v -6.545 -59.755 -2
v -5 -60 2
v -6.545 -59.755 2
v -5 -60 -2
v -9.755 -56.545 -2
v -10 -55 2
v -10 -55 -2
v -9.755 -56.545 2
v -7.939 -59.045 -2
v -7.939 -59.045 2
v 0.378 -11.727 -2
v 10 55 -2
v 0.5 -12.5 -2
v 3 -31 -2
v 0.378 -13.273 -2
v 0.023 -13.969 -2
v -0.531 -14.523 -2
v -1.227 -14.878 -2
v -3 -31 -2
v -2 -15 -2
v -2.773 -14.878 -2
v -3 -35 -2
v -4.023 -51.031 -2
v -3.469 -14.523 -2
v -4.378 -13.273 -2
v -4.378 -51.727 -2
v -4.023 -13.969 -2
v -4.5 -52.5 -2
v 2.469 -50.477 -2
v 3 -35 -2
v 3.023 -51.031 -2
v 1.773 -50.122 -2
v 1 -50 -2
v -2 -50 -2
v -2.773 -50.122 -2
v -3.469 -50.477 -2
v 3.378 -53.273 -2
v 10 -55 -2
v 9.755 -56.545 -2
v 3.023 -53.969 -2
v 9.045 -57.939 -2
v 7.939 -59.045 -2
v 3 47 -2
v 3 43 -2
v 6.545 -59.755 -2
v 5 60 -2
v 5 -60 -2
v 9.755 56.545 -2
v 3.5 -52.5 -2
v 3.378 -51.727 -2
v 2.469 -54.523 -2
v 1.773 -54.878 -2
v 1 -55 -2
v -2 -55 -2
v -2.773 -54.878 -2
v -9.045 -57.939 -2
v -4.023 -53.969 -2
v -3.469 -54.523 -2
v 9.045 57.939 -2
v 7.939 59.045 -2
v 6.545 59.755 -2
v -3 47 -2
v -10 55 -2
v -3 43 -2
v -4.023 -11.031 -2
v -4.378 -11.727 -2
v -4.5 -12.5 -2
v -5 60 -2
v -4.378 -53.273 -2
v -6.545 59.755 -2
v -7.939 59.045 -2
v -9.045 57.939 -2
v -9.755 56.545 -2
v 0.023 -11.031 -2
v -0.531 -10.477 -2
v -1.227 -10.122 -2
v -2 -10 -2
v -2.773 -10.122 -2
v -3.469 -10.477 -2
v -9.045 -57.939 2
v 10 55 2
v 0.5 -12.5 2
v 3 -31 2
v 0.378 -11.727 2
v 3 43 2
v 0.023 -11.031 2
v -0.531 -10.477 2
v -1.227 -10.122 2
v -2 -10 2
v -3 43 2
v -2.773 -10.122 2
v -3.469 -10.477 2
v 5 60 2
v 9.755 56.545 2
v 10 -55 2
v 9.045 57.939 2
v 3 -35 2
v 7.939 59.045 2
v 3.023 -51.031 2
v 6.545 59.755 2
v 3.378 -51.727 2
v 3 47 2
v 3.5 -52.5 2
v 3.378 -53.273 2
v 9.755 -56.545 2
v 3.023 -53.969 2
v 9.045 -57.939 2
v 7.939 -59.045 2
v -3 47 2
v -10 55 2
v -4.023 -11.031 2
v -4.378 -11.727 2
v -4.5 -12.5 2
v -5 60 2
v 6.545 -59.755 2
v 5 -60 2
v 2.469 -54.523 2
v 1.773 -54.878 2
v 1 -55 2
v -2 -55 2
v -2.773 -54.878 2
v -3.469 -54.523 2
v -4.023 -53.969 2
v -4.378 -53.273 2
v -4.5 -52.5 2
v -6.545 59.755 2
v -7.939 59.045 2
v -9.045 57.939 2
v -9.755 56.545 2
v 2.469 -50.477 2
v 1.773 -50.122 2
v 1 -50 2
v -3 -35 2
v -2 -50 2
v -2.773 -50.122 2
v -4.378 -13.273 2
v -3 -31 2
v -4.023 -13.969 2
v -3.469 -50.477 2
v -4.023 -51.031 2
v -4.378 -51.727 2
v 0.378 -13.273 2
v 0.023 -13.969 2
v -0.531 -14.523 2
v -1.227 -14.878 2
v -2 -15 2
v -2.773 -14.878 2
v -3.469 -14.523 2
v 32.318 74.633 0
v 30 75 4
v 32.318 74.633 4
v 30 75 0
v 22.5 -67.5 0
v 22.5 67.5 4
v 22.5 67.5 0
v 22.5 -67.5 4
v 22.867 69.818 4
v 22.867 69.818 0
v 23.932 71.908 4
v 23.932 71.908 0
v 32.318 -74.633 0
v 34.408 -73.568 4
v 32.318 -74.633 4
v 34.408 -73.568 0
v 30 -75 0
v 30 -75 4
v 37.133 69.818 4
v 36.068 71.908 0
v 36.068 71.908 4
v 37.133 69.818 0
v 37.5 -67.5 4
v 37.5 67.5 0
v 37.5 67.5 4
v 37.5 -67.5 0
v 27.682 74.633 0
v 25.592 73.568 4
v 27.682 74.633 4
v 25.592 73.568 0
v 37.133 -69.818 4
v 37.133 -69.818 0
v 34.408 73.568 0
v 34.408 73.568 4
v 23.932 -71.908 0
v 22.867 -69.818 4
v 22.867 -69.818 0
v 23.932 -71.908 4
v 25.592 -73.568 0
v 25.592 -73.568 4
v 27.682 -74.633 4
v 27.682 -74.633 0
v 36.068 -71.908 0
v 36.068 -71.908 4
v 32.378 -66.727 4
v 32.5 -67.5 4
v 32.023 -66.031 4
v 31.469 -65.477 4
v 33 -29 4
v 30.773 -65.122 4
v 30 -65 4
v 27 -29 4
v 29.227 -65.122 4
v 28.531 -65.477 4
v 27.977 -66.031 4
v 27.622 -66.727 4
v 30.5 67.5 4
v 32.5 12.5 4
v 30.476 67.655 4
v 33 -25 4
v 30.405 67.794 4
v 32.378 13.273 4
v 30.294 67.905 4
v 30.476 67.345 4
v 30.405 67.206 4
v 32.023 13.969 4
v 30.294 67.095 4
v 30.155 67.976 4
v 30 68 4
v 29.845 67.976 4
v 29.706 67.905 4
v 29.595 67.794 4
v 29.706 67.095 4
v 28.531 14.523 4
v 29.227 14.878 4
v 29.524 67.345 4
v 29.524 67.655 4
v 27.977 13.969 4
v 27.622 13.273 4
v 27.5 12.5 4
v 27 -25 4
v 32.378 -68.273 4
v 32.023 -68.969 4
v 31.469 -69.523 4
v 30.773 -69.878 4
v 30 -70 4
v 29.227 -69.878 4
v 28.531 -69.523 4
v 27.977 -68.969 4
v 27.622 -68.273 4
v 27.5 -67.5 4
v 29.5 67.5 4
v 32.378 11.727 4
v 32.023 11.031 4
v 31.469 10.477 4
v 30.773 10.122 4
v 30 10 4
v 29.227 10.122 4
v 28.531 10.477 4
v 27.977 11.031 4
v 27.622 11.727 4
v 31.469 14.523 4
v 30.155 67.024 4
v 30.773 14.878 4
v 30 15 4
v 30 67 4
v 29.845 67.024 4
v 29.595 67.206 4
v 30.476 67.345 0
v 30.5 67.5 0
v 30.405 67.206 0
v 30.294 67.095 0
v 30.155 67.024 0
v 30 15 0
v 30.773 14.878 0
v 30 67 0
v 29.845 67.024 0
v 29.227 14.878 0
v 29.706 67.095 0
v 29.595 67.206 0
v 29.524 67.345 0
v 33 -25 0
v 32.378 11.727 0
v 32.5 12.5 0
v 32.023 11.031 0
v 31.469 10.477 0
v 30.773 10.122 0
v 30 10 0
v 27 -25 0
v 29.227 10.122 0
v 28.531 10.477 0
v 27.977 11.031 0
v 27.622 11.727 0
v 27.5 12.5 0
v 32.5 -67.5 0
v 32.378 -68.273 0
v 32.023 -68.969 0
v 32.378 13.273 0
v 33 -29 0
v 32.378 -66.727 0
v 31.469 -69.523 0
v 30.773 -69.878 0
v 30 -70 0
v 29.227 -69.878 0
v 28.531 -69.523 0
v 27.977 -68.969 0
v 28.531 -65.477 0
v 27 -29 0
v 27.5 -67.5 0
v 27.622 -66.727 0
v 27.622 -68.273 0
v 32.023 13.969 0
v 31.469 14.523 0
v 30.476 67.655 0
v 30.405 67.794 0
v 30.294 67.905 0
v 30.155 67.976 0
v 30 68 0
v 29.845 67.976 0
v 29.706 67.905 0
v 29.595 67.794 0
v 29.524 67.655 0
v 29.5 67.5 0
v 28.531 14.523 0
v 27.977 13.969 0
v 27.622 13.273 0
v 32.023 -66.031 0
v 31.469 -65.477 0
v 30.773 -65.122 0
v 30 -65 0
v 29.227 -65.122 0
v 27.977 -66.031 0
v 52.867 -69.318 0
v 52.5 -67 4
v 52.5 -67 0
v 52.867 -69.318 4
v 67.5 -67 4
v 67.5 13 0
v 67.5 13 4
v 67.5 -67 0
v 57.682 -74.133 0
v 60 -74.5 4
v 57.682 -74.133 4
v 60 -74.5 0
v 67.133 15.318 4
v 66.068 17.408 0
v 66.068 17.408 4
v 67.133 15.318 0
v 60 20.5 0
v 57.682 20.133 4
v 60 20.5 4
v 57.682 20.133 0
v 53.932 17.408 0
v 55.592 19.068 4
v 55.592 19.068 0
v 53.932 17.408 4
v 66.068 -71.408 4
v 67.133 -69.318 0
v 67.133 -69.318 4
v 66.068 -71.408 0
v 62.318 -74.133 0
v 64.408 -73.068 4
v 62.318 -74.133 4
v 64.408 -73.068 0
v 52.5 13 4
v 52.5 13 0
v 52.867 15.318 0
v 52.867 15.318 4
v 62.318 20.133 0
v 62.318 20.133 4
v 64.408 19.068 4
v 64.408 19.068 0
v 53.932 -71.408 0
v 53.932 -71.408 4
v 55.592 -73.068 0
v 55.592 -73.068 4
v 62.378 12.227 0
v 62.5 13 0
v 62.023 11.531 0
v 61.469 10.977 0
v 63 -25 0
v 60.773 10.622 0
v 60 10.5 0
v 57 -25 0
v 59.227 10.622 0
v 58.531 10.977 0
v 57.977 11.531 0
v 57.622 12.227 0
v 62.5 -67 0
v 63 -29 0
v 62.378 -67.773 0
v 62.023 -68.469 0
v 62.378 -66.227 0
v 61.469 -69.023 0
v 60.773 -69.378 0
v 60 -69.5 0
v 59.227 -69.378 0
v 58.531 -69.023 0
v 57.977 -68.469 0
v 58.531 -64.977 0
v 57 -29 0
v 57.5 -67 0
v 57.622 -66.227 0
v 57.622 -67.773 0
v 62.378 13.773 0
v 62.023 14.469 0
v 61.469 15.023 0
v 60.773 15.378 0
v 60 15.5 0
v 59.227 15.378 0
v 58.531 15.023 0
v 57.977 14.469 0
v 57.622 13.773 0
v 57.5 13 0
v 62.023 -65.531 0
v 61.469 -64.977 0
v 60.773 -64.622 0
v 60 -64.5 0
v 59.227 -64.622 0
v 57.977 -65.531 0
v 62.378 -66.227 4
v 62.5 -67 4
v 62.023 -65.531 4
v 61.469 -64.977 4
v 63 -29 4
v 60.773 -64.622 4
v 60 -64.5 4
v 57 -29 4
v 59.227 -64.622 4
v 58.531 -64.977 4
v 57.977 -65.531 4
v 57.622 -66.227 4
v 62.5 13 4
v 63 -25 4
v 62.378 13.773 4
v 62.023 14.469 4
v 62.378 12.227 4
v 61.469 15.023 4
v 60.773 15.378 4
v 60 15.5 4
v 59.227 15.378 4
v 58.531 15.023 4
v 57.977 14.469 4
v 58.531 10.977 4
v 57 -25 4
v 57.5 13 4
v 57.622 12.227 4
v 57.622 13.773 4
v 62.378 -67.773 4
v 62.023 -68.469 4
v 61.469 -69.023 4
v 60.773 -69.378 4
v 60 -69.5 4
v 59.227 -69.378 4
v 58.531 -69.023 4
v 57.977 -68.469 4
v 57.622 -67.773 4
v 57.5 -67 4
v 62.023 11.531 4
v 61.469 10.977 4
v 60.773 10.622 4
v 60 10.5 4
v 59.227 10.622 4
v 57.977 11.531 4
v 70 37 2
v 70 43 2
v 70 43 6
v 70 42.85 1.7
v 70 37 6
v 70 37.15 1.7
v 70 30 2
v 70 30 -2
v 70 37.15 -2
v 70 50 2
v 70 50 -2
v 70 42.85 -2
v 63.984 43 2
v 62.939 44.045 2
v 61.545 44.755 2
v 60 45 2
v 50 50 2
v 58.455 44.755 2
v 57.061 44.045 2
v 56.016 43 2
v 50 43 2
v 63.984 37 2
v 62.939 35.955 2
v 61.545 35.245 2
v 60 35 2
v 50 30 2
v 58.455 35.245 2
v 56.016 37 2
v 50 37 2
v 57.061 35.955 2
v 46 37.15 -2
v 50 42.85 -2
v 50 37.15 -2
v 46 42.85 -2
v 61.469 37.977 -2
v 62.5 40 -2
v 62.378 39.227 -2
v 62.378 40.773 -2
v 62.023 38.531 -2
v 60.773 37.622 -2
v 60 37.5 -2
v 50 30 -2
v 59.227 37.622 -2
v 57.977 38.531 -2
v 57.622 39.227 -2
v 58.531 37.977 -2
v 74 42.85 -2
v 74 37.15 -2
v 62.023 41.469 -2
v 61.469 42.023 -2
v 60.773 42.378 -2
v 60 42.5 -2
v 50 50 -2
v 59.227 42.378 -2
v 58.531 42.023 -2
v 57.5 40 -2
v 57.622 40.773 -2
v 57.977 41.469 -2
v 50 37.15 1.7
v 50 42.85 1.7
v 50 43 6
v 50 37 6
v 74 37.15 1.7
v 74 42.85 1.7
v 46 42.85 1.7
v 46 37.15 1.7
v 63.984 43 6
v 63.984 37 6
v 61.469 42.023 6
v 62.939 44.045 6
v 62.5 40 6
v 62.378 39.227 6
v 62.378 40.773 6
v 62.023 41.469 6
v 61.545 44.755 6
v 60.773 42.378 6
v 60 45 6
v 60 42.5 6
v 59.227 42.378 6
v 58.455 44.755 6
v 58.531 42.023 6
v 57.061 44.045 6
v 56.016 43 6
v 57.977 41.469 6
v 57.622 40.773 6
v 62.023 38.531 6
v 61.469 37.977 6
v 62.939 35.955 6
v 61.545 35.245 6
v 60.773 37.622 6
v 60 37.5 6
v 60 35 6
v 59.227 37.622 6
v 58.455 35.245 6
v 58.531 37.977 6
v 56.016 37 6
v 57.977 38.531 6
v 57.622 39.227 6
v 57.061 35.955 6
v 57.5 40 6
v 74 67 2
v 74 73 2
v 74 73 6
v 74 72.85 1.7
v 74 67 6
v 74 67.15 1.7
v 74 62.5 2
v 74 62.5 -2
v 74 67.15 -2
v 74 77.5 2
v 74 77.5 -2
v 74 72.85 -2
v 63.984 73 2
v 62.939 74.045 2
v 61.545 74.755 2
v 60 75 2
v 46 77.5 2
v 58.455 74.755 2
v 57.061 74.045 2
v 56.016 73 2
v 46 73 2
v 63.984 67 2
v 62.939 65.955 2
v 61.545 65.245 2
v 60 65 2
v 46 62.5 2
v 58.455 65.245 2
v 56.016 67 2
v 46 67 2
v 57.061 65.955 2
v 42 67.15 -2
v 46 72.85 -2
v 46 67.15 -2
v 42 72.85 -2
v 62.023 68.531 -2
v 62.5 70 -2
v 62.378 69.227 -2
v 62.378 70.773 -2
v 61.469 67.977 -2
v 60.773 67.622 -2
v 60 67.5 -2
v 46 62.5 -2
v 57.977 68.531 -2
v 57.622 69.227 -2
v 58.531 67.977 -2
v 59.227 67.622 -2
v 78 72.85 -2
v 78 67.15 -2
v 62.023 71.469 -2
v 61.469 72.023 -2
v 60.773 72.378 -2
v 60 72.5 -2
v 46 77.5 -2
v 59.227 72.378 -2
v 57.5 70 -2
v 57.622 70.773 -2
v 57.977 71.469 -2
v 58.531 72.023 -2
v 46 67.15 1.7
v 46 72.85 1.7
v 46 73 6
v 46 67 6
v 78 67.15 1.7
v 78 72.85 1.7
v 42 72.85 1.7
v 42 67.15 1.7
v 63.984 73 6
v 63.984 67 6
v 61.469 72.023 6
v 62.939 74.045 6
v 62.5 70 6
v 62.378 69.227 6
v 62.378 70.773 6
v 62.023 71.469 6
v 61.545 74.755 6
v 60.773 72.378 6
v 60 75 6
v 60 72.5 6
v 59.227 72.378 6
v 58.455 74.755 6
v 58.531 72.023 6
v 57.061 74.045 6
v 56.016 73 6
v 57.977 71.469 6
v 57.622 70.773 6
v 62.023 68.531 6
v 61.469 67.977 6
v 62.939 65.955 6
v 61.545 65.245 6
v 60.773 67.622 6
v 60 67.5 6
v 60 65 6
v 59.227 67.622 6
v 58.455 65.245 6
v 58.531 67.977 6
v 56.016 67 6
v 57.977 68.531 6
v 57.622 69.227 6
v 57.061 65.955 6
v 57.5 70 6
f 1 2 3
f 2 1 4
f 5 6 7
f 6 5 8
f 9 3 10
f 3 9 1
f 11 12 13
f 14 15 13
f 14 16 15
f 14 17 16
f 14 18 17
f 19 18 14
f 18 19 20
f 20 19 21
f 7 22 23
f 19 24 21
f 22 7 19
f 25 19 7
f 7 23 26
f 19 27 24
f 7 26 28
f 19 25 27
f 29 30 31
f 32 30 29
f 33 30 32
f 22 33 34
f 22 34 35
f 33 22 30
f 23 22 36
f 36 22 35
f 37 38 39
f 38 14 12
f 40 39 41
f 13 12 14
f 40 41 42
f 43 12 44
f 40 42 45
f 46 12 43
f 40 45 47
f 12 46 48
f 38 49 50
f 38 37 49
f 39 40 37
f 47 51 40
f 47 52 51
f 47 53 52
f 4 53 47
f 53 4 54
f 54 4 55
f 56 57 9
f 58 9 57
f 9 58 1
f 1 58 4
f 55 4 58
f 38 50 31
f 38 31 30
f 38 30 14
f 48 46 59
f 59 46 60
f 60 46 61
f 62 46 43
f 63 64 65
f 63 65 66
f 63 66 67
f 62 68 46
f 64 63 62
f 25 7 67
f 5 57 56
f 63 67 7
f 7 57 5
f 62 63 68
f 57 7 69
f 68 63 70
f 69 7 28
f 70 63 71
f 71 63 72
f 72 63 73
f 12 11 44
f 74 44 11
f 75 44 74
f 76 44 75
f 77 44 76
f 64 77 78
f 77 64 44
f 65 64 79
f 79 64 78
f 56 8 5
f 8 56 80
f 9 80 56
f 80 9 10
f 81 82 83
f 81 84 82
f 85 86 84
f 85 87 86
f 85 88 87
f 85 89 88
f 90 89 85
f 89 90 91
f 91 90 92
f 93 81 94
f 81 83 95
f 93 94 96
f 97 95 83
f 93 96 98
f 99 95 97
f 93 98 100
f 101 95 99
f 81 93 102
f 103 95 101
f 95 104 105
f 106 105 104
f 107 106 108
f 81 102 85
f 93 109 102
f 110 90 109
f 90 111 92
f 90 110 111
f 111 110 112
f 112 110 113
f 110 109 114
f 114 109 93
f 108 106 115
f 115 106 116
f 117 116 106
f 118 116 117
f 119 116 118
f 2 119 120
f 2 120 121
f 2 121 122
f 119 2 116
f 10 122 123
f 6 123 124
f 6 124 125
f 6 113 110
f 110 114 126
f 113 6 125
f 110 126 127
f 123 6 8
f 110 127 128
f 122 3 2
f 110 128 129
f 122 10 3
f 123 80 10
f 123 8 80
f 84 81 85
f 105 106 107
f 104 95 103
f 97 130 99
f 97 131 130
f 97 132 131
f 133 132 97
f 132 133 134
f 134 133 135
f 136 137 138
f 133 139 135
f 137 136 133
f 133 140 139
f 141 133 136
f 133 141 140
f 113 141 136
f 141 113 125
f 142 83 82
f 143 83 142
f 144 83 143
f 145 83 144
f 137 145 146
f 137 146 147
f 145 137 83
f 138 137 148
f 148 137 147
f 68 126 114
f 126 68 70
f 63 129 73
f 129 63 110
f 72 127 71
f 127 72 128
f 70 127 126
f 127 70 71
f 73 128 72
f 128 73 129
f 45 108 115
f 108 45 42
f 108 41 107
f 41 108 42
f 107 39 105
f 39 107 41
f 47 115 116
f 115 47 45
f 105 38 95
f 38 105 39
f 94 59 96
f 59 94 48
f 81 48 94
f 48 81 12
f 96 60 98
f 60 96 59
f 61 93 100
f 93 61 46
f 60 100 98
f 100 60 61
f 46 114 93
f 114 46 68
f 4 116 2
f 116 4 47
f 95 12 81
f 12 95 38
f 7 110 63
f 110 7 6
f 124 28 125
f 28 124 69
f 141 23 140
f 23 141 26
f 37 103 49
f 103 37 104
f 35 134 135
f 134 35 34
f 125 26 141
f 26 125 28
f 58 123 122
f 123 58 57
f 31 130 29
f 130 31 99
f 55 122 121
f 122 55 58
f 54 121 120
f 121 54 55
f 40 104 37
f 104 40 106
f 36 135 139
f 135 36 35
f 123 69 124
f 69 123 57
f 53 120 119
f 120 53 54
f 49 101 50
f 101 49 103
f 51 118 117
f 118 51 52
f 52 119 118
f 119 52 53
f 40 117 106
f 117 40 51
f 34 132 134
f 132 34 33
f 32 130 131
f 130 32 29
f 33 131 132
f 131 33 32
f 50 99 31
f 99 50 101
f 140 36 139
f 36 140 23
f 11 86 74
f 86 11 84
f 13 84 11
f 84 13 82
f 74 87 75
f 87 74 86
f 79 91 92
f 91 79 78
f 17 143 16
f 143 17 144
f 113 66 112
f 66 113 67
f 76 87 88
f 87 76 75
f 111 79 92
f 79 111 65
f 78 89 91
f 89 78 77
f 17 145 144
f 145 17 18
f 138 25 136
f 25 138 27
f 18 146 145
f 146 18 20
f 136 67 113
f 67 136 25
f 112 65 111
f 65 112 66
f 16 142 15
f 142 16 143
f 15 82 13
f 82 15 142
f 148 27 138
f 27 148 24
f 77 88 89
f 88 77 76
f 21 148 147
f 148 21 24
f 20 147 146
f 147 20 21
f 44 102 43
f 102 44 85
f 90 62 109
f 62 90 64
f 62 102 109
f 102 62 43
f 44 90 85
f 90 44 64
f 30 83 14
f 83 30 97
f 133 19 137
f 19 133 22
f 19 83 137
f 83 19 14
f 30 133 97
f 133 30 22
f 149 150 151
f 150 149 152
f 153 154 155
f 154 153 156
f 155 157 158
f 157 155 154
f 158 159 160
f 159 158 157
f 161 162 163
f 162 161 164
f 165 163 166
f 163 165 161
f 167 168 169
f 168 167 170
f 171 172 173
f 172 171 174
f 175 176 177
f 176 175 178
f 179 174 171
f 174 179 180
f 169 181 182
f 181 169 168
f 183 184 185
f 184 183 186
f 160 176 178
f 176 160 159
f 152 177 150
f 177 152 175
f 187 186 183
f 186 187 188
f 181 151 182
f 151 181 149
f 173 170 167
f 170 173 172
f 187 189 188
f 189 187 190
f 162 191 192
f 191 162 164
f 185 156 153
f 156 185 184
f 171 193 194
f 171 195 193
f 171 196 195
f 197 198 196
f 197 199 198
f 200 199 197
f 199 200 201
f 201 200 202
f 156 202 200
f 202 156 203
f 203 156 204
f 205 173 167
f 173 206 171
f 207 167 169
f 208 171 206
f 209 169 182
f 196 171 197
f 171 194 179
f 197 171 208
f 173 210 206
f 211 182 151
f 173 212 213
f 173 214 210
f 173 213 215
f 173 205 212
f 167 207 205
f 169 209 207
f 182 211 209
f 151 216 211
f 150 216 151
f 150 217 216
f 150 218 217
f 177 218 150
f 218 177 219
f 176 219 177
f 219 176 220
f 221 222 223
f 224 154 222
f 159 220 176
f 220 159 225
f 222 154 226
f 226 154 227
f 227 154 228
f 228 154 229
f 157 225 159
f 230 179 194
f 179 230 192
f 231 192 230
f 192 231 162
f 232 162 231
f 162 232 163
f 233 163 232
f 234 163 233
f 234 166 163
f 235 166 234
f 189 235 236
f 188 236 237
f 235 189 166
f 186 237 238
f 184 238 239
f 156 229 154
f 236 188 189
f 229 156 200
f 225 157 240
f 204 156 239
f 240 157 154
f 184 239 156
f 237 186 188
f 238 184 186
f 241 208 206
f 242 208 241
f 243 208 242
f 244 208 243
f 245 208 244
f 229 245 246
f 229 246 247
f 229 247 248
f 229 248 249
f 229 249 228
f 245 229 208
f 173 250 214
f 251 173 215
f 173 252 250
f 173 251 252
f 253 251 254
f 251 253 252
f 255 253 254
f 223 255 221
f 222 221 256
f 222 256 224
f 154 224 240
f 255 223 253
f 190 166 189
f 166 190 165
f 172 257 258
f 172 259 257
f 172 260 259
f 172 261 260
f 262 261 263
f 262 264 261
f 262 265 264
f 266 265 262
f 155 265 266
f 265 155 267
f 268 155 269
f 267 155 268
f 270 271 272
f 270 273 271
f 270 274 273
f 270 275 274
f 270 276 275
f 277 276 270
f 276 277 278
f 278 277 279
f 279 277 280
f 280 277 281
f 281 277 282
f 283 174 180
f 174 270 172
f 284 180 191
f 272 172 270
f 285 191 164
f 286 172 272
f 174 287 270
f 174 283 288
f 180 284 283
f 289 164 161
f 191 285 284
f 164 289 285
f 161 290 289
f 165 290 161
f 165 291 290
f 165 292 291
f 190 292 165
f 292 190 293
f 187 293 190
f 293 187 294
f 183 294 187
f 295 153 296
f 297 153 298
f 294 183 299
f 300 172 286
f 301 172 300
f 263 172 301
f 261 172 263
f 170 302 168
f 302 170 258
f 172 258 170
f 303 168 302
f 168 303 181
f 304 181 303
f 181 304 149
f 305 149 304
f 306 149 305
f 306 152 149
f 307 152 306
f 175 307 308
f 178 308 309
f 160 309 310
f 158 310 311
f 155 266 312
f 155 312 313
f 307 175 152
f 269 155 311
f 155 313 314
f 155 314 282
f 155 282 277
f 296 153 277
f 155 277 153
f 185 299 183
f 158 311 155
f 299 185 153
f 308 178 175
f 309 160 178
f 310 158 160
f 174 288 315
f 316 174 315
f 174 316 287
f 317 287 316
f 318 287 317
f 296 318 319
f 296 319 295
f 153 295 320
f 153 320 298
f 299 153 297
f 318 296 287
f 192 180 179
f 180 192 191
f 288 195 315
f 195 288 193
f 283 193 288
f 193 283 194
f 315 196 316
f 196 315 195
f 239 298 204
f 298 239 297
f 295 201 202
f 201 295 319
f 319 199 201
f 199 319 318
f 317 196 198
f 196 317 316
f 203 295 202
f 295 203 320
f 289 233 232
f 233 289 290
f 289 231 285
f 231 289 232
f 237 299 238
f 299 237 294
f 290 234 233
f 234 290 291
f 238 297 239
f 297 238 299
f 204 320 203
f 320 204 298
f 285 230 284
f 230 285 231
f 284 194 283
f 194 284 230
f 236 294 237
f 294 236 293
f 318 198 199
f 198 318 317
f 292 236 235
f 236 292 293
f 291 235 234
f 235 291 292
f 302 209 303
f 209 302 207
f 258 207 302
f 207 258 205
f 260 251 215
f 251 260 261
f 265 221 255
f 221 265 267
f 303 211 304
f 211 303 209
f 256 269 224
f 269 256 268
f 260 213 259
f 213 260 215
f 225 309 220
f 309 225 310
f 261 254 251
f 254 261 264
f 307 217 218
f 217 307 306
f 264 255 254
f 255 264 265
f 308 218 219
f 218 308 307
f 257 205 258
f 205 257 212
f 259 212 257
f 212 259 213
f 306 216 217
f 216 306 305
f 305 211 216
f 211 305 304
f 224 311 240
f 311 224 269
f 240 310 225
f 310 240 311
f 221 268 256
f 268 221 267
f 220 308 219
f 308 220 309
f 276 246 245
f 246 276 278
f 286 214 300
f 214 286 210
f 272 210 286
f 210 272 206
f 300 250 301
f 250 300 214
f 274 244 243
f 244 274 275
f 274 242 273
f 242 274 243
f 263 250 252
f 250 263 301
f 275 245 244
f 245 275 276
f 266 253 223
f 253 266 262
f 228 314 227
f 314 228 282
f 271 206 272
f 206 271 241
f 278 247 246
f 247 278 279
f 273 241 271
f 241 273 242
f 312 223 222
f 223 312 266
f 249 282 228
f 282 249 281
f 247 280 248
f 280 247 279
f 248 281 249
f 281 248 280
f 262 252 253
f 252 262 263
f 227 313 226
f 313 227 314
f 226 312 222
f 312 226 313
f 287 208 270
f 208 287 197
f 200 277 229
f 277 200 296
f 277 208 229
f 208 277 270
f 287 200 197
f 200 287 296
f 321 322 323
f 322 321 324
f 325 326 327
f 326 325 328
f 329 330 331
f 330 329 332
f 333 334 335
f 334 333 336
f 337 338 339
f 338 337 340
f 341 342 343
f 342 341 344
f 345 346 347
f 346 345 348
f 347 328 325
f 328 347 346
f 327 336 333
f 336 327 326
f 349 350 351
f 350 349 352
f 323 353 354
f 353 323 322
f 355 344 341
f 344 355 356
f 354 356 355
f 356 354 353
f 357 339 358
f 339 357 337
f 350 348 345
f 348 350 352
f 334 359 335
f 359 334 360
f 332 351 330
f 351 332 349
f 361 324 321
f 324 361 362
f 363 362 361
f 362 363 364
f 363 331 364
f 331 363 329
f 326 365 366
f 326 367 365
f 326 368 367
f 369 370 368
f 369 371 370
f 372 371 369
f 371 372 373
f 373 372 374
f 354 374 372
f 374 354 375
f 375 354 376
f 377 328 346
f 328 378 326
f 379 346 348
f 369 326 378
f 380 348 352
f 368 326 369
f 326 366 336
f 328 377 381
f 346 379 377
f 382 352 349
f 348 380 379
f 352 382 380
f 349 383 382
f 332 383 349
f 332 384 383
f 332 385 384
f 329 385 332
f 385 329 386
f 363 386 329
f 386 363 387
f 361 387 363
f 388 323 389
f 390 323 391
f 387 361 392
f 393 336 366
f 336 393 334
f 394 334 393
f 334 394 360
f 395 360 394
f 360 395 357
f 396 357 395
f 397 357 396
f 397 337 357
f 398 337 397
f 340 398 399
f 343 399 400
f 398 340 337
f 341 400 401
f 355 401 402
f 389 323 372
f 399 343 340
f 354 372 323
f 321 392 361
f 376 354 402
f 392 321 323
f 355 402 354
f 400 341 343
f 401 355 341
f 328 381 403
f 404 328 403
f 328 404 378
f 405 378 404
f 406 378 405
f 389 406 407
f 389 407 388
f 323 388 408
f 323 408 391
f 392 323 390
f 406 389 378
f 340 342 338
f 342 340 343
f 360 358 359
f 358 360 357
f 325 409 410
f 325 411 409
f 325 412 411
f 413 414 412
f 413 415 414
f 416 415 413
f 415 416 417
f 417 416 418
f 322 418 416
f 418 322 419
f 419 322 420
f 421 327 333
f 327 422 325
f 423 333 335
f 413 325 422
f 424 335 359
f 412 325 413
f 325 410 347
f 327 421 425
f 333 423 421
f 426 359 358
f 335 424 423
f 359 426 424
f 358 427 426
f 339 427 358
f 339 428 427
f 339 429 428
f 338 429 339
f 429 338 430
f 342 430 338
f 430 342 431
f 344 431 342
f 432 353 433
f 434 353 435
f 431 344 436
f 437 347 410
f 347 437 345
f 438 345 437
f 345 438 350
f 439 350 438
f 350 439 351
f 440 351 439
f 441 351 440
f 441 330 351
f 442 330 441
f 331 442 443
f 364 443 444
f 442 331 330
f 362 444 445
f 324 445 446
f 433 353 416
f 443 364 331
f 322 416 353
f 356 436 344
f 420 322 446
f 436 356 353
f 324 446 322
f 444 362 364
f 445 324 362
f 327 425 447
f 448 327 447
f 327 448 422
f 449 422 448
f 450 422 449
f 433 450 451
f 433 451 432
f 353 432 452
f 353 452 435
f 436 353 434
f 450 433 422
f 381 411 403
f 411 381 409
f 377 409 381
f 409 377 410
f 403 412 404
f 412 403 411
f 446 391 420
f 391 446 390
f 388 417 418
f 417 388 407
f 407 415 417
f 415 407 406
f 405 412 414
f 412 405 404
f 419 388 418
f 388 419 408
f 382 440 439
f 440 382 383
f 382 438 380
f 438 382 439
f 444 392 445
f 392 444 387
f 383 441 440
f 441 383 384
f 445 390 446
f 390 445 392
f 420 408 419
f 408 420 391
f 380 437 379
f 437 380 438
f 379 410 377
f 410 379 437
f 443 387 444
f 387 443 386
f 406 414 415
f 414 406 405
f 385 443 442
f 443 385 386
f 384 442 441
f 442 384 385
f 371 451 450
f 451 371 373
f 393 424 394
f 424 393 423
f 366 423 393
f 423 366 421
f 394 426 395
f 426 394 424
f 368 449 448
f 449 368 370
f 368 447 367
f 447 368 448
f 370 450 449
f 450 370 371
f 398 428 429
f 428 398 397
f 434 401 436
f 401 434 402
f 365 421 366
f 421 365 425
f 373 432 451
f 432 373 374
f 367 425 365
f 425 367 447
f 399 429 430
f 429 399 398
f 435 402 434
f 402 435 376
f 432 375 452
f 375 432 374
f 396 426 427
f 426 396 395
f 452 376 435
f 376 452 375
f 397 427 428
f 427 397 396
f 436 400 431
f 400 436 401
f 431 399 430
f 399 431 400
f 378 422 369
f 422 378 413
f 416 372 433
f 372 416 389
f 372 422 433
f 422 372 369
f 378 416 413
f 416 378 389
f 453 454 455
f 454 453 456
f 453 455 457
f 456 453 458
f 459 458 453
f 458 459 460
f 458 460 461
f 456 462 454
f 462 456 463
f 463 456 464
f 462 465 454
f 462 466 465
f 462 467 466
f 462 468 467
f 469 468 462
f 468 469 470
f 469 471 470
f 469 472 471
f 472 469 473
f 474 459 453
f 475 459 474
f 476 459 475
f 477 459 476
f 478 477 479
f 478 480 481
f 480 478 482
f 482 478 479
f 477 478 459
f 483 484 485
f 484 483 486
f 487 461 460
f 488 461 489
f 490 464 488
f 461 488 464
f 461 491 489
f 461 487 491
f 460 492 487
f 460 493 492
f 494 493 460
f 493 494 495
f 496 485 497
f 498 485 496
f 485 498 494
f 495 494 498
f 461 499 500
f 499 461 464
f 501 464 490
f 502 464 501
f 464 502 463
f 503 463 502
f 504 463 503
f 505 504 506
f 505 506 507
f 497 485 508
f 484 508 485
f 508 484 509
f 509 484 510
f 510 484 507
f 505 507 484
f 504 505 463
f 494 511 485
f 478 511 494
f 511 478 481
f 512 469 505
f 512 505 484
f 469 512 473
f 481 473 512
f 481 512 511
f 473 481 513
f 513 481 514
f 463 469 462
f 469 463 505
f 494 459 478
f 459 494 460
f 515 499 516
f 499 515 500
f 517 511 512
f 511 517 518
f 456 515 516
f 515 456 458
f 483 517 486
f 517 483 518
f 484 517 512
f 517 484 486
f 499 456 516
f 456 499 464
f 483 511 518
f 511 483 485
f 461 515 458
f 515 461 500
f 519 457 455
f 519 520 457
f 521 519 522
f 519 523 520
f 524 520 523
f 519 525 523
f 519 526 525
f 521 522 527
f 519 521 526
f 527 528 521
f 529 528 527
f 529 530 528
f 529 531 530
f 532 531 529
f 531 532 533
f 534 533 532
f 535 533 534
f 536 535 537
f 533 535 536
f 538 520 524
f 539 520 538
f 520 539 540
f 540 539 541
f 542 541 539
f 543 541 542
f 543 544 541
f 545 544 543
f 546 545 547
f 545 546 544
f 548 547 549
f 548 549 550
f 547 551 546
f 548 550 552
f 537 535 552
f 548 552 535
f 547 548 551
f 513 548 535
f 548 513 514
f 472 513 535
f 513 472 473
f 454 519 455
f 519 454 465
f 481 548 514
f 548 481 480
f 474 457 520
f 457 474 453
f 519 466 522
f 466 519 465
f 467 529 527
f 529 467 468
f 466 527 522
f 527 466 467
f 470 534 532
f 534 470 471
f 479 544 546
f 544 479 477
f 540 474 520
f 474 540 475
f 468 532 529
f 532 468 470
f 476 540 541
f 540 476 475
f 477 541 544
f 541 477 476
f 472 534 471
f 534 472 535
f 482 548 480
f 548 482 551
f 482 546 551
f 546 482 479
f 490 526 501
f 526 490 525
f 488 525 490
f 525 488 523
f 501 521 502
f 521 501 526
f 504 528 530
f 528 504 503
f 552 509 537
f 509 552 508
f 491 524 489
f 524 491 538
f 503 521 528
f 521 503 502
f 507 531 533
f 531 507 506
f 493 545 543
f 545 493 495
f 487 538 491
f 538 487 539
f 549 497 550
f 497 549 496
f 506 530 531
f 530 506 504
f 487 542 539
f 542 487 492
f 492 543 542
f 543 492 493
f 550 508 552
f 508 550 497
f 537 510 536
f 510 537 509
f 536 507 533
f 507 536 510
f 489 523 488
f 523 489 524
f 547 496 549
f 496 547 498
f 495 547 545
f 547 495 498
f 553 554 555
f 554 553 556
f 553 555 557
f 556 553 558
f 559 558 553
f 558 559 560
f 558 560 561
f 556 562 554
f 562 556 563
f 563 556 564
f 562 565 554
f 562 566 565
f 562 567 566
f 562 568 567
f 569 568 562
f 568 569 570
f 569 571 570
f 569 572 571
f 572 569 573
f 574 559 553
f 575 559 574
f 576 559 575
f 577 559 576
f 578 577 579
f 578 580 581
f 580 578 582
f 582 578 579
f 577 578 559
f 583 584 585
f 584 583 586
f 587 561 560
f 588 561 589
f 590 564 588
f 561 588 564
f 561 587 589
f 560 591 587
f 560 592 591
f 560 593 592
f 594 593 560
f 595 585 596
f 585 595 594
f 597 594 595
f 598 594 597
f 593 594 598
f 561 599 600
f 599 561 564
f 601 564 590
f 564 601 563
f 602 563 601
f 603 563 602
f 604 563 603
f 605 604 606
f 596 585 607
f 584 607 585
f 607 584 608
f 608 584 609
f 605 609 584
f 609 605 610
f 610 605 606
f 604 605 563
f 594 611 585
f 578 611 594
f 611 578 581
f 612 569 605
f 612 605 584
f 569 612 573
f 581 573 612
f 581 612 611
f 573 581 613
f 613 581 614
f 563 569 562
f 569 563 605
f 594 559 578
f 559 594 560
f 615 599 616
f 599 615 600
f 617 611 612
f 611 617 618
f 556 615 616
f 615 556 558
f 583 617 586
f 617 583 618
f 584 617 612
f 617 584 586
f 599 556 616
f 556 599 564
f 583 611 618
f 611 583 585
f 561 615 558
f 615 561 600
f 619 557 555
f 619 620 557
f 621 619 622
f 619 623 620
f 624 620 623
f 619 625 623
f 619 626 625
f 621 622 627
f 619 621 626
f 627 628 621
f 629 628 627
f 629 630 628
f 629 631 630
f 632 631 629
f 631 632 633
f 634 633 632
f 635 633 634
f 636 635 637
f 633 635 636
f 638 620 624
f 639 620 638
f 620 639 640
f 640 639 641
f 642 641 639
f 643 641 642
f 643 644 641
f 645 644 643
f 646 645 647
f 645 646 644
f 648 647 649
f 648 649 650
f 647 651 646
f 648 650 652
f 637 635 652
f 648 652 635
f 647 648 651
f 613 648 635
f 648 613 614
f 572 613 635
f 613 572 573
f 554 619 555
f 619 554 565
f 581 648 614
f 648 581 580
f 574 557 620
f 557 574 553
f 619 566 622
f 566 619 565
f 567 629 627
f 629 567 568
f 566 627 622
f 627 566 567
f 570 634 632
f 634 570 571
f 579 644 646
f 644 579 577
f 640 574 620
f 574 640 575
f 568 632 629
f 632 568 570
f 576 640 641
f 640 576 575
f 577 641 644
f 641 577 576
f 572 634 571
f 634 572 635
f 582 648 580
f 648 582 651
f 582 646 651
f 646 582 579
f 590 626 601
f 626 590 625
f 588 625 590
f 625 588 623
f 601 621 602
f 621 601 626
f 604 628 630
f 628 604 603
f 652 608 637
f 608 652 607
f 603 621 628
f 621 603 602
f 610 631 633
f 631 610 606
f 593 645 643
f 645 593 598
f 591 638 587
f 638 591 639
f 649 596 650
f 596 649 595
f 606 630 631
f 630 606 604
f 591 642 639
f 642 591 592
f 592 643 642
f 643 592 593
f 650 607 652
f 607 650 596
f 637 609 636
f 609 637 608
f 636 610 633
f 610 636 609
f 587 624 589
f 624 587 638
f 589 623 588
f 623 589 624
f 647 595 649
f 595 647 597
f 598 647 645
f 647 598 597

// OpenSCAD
$fn = 20;

DEMO = true;

SPACER_LENGTH = 6;

ARMS_SPACING = 20;

ARM_THICKNESS = 4;
ARM_WIDTH = 20;

module arm(width, length, height, hole = [5, 5], gap_width = 0, gap_length = 0) {

    difference() {
        hull() {
            translate([0, - length / 2, 0])
                cylinder(h = height, r1 = width / 2, r2 = width / 2);

            translate([0, length / 2, 0])
                cylinder(h = height, r1 = width / 2, r2 = width / 2);
        }

        // Hole
        translate([0, - length / 2, -1])
            cylinder(h = height + 1, r1 = hole[0] / 2, r2 = hole[0] / 2);
        translate([0, length / 2, -1])
            cylinder(h = height + 1, r1 = hole[1] / 2, r2 = hole[1] / 2);

        if (gap_width) {
            difference() {
                translate([0, 0,  height / 2])
                    cube(size = [gap_width, length - width, height * 2], center = true);
                translate([0, - length / 2, 0])
                    cylinder(h = height * 2, r1 = width / 2 + gap_length, r2 = width / 2 + gap_length);
                translate([0, length / 2, 0])
                    cylinder(h = height * 2, r1 = width / 2 + gap_length, r2 = width / 2 + gap_length);
            }
        }
    }
}

// Long arm
module long_arm() {
    difference() {
        arm(15, 135, 4, [5, 1], 0, 0);

        translate([0, 12.5, -1]) {
            cylinder(h = 20, r1 = 2.5, r2 = 2.5);
        }

        translate([0, - 27, 0]) {
            cube(size = [ SPACER_LENGTH, ARM_THICKNESS, 10 ], center = true);
        }
    }
}

module short_arm() {
    difference() {
        arm(15, 80, 4, [5, 5], 0, 0);
        cube(size = [ SPACER_LENGTH, ARM_THICKNESS, 10 ], center = true);
    }
}

module main_arm() {

    size = [ ARM_WIDTH, 120, ARM_THICKNESS ];
    radius = 5;
    oblong_length = 3;

    difference() {
        union() {
            // From MCAD library
            cube(size - [2*radius,0,0], true);
            cube(size - [0,2*radius,0], true);
            for (x = [radius-size[0]/2, -radius+size[0]/2],
                   y = [radius-size[1]/2, -radius+size[1]/2]) {
                translate([x,y,0]) cylinder(r=radius, h=size[2], center=true);
            }
        }

        // Hole
        union() {
            hull() {
                translate([ size[0] / 2 - 12, - size[1] / 2 + 7.5, -5]) {
                    cylinder(h = 10, r1 = 2.5, r2 = 2.5);
                }

                translate([ size[0] / 2 - 12 + oblong_length, - size[1] / 2 + 7.5, -5]) {
                    cylinder(h = 10, r1 = 2.5, r2 = 2.5);
                }
            }

            translate([ size[0] / 2 - 12, - size[1] / 2 + 47.5, -5]) {
                cylinder(h = 10, r1 = 2.5, r2 = 2.5);
            }
        }

        // Spacer hole
        union() {
            translate([0, size[1] / 2 - 15, 0]) {
                cube(size = [ SPACER_LENGTH, ARM_THICKNESS, 10 ], center = true);
            }

            translate([0, - size[1] / 2 + 27, 0]) {
                cube(size = [ SPACER_LENGTH, ARM_THICKNESS, 10 ], center = true);
            }
        }
    }
}

module spacer(length, width, thickness) {

    SPACE = 0.3;

    difference() {
        union() {
            cube([ length, width, thickness ], center = true);

            translate([0, 0, - SPACE / 2]) {
                cube(size = [ length + thickness * 2, SPACER_LENGTH - SPACE, ARM_THICKNESS - SPACE ], center = true);
            }

            translate([ 0, 0, thickness ]) {
                cube(size = [ length, SPACER_LENGTH, ARM_THICKNESS ], center = true);
            }

            translate([ 0, 0, thickness / 2]) {
                cylinder(h = thickness, r1 = 5, r2 = 5);
            }
        }

        translate([ 0, 0, -10 ]) {
            cylinder(h = 100, r1 = 2.5, r2 = 2.5);
        }
    }
}


if (1) {
    main_arm();

    translate([30, 0, 0]) {
        long_arm();
    }

    // Basic arm
    translate([60, -27, 0]) {
        short_arm();
    }

    translate([60, 40, 0]) {
        rotate([0, 0, 0]) {
            spacer(ARMS_SPACING, ARM_WIDTH, ARM_THICKNESS);

            translate([0, 30, 0]) {
                spacer(ARMS_SPACING + ARM_THICKNESS * 2, 15, ARM_THICKNESS);
            }
        }
    }
}


//main_arm();
//long_arm();
//short_arm();
//spacer(ARMS_SPACING, ARM_WIDTH, ARM_THICKNESS);
//spacer(ARMS_SPACING + ARM_THICKNESS * 2, 15, ARM_THICKNESS);
